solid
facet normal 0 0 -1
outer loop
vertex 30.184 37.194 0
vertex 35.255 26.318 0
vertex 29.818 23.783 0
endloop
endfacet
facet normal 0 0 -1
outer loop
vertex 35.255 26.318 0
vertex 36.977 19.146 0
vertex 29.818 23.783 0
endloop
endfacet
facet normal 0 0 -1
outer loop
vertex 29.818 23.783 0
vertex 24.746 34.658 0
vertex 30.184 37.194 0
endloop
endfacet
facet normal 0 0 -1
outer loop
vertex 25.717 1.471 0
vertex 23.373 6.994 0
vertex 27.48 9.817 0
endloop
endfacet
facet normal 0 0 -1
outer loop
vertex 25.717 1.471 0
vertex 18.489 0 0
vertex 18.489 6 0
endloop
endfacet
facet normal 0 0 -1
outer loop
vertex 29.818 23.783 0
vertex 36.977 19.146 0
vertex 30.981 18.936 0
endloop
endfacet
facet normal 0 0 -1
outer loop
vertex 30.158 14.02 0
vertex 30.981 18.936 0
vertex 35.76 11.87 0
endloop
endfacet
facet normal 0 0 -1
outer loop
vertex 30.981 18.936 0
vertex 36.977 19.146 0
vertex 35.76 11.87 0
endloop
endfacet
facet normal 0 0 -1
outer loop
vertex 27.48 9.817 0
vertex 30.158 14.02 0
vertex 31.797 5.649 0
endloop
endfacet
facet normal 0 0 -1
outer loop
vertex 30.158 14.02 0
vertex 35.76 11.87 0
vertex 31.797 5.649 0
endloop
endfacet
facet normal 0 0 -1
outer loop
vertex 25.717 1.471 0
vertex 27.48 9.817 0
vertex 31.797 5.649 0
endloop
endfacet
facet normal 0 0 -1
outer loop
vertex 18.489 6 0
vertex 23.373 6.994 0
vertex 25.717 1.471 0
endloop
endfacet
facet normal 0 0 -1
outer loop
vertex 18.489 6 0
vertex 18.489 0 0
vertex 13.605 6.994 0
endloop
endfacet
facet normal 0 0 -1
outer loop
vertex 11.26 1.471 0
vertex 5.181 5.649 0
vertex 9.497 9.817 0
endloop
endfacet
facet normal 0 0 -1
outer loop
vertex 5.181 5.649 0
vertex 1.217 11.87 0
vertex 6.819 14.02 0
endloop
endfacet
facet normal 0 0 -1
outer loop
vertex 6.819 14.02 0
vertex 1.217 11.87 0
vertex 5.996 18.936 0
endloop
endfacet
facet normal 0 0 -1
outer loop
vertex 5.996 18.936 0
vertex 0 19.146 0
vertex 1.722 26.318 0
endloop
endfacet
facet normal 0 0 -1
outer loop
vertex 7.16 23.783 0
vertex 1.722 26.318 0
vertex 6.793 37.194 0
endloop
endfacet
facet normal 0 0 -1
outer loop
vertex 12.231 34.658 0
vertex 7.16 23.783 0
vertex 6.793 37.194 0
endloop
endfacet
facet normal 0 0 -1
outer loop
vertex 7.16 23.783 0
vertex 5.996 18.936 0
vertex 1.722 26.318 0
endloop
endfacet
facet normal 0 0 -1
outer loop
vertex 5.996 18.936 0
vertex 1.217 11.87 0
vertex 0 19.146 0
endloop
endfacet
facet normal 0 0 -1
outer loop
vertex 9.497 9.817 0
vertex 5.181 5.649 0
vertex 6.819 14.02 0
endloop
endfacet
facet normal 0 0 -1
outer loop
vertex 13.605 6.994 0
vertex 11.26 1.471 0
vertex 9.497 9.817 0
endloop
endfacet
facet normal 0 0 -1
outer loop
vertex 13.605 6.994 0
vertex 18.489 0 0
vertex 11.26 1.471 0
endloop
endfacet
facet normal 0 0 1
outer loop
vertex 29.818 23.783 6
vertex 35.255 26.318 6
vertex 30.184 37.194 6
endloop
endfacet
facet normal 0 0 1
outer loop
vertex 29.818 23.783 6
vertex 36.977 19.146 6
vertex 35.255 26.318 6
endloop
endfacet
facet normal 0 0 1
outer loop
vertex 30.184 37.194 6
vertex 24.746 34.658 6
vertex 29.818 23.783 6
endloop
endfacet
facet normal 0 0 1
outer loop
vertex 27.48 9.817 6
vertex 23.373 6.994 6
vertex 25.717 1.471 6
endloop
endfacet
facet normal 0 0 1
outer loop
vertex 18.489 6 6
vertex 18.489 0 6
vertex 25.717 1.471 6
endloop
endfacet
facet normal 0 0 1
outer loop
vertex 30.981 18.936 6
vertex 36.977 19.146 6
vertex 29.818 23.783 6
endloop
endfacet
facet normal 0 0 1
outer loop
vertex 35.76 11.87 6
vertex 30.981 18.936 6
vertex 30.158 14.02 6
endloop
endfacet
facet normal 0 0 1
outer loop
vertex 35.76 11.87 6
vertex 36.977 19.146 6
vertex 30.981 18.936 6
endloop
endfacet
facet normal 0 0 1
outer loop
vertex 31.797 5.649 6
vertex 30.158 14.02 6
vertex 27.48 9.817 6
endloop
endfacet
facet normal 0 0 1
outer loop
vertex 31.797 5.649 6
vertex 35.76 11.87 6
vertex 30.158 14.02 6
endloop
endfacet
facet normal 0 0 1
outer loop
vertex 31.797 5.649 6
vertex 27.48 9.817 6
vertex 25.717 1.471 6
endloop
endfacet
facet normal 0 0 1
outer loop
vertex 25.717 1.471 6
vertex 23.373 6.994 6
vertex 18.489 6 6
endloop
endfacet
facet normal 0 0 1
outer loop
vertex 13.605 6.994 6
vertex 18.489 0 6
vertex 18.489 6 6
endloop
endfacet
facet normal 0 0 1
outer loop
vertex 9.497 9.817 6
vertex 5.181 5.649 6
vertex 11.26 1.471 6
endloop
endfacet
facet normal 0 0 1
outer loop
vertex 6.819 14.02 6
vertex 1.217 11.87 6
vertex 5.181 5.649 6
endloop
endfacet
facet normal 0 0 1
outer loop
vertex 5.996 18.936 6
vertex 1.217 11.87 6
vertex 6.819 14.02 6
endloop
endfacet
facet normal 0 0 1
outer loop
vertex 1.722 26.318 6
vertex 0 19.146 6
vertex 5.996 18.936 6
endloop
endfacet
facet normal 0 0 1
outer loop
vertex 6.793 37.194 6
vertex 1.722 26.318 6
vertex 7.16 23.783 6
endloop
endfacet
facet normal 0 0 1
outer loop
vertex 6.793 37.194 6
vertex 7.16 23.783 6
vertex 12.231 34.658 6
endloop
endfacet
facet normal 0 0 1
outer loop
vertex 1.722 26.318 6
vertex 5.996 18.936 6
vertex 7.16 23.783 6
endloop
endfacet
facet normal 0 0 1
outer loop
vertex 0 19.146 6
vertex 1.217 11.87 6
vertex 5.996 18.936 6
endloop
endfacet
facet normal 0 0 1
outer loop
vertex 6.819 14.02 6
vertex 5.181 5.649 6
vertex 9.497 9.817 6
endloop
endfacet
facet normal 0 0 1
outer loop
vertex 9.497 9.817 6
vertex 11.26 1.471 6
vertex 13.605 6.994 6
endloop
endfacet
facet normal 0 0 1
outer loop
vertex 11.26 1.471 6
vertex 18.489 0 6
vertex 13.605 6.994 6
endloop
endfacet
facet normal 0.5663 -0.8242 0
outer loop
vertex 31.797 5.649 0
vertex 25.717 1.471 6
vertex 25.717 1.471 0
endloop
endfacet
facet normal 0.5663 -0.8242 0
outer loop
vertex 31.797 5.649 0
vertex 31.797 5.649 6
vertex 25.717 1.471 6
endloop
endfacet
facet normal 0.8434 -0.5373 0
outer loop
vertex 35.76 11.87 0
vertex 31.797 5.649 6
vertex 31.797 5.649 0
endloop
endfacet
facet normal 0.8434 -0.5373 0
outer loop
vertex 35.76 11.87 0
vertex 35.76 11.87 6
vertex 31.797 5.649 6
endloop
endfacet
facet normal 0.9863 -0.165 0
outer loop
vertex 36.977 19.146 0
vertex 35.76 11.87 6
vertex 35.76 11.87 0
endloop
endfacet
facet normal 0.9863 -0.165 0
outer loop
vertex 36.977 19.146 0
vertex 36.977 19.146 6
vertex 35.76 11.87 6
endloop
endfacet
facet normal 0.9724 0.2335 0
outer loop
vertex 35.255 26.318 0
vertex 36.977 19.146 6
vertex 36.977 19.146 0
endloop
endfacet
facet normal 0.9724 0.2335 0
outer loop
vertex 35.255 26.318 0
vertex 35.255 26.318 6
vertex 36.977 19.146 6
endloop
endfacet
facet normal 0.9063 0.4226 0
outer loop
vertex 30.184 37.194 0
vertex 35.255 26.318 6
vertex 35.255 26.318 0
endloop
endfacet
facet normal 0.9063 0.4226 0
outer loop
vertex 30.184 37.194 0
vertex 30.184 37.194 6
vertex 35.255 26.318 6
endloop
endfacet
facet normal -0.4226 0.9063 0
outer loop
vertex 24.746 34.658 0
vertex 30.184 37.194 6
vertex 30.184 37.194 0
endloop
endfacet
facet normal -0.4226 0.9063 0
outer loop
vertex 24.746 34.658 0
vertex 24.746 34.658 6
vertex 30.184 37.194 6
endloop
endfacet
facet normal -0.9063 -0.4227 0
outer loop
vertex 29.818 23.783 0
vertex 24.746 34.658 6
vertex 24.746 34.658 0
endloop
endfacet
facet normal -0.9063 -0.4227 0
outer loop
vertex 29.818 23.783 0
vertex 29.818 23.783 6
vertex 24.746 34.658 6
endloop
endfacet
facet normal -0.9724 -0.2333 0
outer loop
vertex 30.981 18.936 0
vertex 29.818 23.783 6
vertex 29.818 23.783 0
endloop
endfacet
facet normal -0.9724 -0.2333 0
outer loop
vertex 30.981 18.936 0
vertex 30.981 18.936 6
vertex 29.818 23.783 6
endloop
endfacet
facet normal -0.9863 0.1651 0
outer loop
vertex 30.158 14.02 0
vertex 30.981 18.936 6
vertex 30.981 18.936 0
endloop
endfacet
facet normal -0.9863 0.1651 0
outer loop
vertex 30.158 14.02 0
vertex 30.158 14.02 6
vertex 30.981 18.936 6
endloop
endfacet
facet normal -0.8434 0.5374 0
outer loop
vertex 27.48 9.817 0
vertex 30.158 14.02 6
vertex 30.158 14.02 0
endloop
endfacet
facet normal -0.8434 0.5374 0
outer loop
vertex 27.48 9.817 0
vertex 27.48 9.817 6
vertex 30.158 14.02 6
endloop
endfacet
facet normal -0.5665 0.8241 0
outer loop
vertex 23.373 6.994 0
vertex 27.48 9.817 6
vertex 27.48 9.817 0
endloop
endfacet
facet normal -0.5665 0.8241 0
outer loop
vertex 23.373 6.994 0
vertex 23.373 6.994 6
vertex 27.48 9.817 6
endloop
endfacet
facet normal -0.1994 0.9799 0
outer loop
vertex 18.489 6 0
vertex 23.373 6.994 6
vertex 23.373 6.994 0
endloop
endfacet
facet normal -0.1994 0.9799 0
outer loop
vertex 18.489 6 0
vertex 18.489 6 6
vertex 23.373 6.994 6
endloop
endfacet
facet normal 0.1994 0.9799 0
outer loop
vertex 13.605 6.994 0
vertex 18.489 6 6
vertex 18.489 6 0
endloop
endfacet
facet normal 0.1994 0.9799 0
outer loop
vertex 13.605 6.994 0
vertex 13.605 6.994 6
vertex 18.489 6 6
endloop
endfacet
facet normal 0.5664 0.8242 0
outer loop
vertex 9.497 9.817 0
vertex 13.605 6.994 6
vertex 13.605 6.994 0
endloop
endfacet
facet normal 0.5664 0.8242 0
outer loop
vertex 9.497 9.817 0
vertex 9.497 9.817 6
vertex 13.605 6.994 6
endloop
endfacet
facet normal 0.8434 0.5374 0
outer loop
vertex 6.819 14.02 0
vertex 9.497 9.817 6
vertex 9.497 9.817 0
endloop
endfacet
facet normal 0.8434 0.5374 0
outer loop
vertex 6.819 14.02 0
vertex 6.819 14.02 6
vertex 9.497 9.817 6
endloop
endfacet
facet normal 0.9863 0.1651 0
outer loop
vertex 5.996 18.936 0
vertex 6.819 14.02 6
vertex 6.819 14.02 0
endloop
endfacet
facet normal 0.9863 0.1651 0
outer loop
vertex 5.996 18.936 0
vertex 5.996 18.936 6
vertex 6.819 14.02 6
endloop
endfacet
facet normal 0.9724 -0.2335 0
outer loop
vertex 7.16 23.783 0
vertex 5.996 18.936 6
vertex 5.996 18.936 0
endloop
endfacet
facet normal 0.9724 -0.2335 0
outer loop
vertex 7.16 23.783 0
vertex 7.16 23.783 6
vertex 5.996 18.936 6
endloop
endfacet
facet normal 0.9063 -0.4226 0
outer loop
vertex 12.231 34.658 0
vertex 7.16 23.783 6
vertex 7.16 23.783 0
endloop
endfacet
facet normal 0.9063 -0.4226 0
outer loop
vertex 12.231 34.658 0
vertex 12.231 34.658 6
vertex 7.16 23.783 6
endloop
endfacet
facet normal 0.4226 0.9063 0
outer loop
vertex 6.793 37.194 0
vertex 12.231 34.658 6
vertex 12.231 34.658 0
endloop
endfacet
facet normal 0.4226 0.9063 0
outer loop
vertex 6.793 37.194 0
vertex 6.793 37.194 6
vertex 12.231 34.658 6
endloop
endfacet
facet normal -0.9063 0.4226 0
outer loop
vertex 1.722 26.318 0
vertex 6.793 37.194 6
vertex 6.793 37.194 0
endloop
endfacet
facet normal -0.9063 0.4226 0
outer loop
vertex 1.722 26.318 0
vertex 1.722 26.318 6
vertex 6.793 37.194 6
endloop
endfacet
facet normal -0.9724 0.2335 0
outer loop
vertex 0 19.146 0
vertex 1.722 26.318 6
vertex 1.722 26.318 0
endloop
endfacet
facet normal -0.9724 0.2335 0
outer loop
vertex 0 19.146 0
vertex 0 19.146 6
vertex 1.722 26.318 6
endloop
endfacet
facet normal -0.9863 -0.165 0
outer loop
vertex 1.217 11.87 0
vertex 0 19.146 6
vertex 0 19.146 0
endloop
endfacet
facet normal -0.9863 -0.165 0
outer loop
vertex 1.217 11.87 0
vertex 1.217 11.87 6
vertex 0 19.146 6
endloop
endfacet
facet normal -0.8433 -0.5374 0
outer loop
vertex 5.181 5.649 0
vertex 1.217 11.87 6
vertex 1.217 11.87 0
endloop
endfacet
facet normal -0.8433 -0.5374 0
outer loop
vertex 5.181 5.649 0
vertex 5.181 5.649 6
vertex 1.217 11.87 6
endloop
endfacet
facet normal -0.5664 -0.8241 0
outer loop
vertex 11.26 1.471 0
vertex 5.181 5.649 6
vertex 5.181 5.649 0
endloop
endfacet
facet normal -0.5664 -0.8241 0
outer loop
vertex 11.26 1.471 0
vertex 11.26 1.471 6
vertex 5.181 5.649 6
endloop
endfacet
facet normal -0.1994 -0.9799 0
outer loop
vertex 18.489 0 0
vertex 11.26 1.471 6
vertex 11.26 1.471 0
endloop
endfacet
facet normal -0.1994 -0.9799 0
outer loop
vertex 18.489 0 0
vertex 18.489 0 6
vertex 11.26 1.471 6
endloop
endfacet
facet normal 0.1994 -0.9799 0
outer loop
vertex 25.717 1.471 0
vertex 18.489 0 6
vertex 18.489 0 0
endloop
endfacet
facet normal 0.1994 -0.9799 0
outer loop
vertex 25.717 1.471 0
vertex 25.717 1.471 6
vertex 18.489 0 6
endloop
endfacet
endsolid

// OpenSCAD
$fn = 32;

// ----------------------------------------------------------------------
// Clip blank: omega clip, 6 mm thick
// ----------------------------------------------------------------------

// --- parameters (mm) ---
profile_height = 6;       // extrusion height
profile_points = 26;      // points of the closed outline

profile = [[1.722, 26.318], [0, 19.146], [1.217, 11.87], [5.181, 5.649], [11.26, 1.471], [18.489, 0], [25.717, 1.471], [31.797, 5.649], [35.76, 11.87], [36.977, 19.146], [35.255, 26.318], [30.184, 37.194], [24.746, 34.658], [29.818, 23.783], [30.981, 18.936], [30.158, 14.02], [27.48, 9.817], [23.373, 6.994], [18.489, 6], [13.605, 6.994], [9.497, 9.817], [6.819, 14.02], [5.996, 18.936], [7.16, 23.783], [12.231, 34.658], [6.793, 37.194]];  // single closed polygon, 26 points, counter clockwise

// --- the one profile operation ---
linear_extrude(height = profile_height) polygon(points = profile);
